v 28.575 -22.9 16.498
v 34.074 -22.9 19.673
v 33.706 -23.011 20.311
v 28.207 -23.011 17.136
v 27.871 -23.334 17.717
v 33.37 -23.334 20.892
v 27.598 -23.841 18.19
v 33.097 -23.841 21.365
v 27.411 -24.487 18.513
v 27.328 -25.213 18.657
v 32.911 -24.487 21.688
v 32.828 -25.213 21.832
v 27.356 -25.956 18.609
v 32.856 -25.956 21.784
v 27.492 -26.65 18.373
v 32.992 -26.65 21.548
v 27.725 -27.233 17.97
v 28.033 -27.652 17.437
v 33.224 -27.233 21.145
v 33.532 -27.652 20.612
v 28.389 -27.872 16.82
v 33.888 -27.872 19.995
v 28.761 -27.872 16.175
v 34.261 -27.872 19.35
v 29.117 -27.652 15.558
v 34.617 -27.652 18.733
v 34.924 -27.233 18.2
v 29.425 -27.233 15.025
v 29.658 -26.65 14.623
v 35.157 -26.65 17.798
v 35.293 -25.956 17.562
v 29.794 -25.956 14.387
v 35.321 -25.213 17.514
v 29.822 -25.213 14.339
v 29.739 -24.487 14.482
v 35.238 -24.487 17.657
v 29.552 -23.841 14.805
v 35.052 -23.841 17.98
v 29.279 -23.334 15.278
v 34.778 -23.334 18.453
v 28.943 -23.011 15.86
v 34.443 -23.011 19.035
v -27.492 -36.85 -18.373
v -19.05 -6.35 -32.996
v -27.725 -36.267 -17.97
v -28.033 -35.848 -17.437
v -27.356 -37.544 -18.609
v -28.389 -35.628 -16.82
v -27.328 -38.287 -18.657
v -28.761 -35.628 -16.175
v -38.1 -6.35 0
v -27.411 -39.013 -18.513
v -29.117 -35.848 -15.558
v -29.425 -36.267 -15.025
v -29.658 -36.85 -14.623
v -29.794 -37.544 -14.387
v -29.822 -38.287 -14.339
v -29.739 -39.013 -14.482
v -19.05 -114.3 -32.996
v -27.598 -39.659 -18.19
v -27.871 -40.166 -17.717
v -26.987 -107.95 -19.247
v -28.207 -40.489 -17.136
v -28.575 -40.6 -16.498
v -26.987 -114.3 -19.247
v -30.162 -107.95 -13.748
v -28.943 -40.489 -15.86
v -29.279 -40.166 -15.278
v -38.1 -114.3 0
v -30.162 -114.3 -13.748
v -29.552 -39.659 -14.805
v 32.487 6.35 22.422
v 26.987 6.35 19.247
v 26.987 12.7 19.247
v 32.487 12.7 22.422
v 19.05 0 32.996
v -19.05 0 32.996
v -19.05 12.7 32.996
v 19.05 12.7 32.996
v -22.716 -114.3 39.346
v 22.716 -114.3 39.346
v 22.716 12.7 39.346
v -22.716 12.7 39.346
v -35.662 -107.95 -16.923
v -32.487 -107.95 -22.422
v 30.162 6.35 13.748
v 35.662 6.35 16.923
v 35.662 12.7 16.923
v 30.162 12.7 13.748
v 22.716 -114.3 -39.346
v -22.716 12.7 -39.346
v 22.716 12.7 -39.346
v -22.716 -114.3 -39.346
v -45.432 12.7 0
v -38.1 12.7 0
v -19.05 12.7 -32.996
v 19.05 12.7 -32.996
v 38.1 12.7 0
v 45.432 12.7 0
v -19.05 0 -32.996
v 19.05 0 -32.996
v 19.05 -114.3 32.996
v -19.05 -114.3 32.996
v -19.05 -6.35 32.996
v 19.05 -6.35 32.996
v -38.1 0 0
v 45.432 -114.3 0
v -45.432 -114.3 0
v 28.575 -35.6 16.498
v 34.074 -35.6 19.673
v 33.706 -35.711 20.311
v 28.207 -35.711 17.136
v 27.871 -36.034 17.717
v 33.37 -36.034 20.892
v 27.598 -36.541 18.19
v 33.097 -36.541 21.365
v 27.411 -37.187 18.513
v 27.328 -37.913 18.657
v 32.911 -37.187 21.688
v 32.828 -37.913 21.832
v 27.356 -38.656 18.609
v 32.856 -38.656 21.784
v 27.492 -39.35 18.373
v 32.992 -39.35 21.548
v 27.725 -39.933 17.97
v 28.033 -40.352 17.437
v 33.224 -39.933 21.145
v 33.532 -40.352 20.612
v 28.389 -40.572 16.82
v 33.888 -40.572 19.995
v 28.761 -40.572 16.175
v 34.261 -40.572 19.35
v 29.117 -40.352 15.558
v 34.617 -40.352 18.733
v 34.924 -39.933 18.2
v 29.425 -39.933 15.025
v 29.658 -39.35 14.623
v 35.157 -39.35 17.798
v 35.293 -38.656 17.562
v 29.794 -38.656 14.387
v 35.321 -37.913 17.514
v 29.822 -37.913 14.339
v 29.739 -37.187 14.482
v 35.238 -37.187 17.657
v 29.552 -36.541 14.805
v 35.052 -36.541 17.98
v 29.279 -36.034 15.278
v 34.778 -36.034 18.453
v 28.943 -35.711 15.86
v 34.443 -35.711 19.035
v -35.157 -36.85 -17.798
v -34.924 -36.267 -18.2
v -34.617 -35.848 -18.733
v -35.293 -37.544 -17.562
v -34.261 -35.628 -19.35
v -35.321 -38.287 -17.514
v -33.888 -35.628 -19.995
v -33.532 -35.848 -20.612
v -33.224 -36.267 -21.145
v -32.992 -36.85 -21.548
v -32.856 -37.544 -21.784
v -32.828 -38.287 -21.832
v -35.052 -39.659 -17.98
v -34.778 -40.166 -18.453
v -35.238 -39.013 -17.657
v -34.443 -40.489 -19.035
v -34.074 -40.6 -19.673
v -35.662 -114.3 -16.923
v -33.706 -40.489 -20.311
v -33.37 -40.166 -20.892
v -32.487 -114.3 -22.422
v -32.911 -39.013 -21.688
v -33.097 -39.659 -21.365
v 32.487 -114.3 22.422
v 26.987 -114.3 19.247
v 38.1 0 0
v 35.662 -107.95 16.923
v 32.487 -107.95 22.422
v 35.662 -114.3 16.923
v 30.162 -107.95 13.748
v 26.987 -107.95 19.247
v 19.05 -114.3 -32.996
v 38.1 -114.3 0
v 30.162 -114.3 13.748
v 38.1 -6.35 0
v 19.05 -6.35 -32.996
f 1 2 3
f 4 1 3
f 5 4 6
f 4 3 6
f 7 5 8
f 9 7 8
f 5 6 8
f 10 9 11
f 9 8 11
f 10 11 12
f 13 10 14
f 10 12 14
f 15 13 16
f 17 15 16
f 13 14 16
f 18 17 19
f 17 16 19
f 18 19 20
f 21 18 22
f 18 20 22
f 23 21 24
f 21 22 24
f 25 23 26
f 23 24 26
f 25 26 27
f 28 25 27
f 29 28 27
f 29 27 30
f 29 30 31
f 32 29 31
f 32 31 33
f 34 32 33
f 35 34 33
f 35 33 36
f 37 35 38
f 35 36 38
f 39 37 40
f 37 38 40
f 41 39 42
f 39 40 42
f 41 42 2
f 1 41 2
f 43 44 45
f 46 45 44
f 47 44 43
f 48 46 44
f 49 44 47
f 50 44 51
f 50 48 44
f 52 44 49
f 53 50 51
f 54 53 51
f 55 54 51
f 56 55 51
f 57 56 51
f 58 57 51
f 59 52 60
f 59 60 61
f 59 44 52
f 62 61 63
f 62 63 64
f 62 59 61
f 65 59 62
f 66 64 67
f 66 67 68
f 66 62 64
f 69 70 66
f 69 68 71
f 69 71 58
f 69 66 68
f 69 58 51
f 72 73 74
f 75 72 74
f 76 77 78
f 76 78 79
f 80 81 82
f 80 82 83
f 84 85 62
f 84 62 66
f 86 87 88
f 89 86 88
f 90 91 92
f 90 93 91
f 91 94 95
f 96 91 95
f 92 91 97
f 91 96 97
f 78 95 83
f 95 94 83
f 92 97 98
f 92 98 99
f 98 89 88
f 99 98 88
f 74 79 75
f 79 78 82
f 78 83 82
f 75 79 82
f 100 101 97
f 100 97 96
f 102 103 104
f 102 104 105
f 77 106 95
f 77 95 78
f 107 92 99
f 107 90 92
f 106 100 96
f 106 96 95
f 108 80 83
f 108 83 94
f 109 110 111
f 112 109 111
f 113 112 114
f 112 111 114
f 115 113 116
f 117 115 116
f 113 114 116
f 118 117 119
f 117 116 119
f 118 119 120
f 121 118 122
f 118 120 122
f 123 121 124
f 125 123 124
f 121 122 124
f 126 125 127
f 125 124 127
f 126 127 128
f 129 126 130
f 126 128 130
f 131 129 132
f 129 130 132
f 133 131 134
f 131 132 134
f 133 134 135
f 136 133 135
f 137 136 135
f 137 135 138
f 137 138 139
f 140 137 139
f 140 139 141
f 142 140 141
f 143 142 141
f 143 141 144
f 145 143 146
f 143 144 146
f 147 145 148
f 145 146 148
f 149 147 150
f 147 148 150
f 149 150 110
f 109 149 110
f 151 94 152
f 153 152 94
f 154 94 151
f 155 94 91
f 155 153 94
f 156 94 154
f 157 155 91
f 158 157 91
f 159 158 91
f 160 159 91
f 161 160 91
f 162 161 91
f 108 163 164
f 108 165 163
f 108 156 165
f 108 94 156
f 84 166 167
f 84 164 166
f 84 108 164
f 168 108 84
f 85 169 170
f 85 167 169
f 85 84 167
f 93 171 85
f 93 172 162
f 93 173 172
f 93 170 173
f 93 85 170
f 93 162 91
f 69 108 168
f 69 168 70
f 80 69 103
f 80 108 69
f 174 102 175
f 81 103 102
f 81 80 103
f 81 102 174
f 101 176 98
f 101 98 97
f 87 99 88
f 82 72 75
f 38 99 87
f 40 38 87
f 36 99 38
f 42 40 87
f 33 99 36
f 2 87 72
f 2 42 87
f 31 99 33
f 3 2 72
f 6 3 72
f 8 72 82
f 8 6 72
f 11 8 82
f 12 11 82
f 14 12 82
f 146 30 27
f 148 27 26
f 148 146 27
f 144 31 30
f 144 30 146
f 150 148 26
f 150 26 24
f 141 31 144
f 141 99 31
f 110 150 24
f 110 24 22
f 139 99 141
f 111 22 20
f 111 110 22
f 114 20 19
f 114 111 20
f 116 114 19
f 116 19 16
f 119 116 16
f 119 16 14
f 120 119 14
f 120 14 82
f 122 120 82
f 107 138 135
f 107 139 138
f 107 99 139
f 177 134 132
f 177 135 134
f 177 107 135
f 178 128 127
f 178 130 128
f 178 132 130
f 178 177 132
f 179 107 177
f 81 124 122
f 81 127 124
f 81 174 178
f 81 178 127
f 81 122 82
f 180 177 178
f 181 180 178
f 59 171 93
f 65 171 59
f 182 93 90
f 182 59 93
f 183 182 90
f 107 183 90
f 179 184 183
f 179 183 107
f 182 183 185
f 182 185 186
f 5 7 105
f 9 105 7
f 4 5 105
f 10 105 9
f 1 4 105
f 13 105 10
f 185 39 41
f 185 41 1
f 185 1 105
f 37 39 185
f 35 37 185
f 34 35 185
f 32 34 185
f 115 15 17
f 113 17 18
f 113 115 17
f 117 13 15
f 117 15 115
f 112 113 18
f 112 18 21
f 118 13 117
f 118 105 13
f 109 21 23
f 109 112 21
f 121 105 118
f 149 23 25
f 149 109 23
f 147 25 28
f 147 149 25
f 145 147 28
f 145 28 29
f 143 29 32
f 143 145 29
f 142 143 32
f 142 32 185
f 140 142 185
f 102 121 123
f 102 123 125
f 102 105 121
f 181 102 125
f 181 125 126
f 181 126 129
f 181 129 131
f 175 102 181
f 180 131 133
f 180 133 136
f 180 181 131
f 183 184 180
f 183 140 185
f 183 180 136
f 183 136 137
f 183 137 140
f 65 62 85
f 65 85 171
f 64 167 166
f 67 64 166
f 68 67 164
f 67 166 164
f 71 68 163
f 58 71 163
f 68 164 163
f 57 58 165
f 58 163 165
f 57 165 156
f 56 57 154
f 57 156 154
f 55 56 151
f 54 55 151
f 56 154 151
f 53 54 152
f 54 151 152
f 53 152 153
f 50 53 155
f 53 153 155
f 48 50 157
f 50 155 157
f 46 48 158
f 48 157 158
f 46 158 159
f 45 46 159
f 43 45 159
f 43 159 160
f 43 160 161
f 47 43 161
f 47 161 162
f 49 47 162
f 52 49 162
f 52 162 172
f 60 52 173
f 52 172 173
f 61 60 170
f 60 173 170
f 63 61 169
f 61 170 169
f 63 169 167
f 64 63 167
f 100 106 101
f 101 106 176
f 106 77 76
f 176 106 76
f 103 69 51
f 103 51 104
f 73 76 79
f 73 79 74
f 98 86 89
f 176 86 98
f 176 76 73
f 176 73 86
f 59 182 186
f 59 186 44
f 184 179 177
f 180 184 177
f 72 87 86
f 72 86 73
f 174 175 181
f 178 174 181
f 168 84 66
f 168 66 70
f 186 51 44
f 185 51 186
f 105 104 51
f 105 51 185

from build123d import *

# Parameters (mm, degrees)
F1_DEPTH  = 114.3
F2_DEPTH  = 12.7
F4_DEPTH  = 6.35
F5_W      = 6.35
F5_H      = 6.35
F6_DEPTH  = 6.35
F7_W      = 6.35
F7_H      = 6.35
F8_DEPTH  = 6.35
F9_R      = 2.5
F10_DEPTH = 6.35
F11_R     = 2.5
F12_DEPTH = 6.35
F13_W     = 6.35
F13_H     = 6.35
F14_DEPTH = 6.35


with BuildPart() as f1:
    # F0 (on Front) → F1 (new body)
    with BuildSketch(Plane.XZ):
        Polygon((45.4323484187, 0), (22.7161742094, 39.3455678842), (-22.7161742094, 39.3455678842), (-45.4323484187, 0), (-22.7161742094, -39.3455678842), (22.7161742094, -39.3455678842), align=None)
        Polygon((38.1, 0), (19.05, -32.9955678842), (-19.05, -32.9955678842), (-38.1, 0), (-19.05, 32.9955678842), (19.05, 32.9955678842), align=None, mode=Mode.SUBTRACT)
    extrude(amount=F1_DEPTH)

    # F0 (on Front) → F2 (join)
    with BuildSketch(Plane.XZ):
        Polygon((45.4323484187, 0), (22.7161742094, 39.3455678842), (-22.7161742094, 39.3455678842), (-45.4323484187, 0), (-22.7161742094, -39.3455678842), (22.7161742094, -39.3455678842), align=None)
        Polygon((38.1, 0), (19.05, -32.9955678842), (-19.05, -32.9955678842), (-38.1, 0), (-19.05, 32.9955678842), (19.05, 32.9955678842), align=None, mode=Mode.SUBTRACT)
    extrude(amount=-F2_DEPTH)

    # F3 (on Front) → F4 (join)
    with BuildSketch(Plane.XZ):
        Polygon((19.05, -32.9955678842), (38.1, 0), (19.05, 32.9955678842), (-19.05, 32.9955678842), (-38.1, 0), (-19.05, -32.9955678842), align=None)
    extrude(amount=F4_DEPTH)

    # F5 (on face) → F6 (cut)
    with BuildSketch(Plane(origin=(34.074261314, 0, 19.6727839421), x_dir=(0, 1, 0), z_dir=(0.8660254038, 0, 0.5))):
        with Locations((-111.125, 0)):
            Rectangle(F5_W, F5_H)
    extrude(amount=-F6_DEPTH, mode=Mode.SUBTRACT)

    # F7 (on face) → F8 (cut)
    with BuildSketch(Plane(origin=(-34.074261314, 0, -19.6727839421), x_dir=(0, -1, 0), z_dir=(-0.8660254038, 0, -0.5))):
        with Locations((111.125, 0)):
            Rectangle(F7_W, F7_H)
    extrude(amount=-F8_DEPTH, mode=Mode.SUBTRACT)

    # F9 (on face) → F10 (cut)
    with BuildSketch(Plane(origin=(-34.074261314, 0, -19.6727839421), x_dir=(0, -1, 0), z_dir=(-0.8660254038, 0, -0.5))):
        with Locations((38.1, 0)):
            Circle(F9_R)
    extrude(amount=-F10_DEPTH, mode=Mode.SUBTRACT)

    # F11 (on face) → F12 (cut)
    with BuildSketch(Plane(origin=(34.074261314, 0, 19.6727839421), x_dir=(0, 1, 0), z_dir=(0.8660254038, 0, 0.5))):
        with Locations((-38.1, 0)):
            Circle(F11_R)
        with Locations((-25.4, 0)):
            Circle(F11_R)
    extrude(amount=-F12_DEPTH, mode=Mode.SUBTRACT)

    # F13 (on face) → F14 (cut)
    with BuildSketch(Plane(origin=(34.074261314, 0, 19.6727839421), x_dir=(0, 1, 0), z_dir=(0.8660254038, 0, 0.5))):
        with Locations((9.525, 0)):
            Rectangle(F13_W, F13_H)
    extrude(amount=-F14_DEPTH, mode=Mode.SUBTRACT)


solid = f1.part
